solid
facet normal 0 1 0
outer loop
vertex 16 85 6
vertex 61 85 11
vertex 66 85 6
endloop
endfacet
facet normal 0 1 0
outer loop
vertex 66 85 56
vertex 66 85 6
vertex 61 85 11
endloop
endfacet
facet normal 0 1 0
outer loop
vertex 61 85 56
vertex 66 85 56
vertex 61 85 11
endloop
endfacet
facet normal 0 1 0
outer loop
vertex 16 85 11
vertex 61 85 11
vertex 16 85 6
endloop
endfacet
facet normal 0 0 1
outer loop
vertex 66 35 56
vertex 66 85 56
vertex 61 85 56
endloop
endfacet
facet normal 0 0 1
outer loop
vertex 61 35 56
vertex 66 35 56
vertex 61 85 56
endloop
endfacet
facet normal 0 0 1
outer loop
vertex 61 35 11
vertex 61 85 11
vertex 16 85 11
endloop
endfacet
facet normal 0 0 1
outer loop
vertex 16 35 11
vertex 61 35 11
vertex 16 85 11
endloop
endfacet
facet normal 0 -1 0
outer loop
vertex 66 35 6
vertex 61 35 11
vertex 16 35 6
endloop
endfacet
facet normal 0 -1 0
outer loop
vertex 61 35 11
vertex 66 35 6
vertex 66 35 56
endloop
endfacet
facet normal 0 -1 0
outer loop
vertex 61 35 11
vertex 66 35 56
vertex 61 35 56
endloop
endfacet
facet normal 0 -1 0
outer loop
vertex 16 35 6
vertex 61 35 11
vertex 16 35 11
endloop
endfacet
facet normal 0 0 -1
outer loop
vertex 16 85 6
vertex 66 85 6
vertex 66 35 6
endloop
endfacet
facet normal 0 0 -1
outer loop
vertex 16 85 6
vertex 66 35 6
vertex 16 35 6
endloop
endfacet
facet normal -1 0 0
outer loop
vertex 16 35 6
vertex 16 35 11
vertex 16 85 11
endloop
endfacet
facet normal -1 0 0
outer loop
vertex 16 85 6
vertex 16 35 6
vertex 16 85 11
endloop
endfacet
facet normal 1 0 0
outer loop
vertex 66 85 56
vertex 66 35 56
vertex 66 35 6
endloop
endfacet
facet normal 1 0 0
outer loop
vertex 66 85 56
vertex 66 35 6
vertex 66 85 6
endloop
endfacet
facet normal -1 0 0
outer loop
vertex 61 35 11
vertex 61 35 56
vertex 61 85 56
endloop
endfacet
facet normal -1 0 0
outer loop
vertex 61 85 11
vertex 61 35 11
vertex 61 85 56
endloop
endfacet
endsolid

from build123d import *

# Parameters (mm, degrees)
BOX007_W                  = 50
BOX007_H                  = 58
BOX007_DEPTH              = 50
BOX006_W                  = 50
BOX006_H                  = 50
BOX006_DEPTH              = 50
CUT002008_PLACEMENT_ANGLE = 180


with BuildPart() as cube002:
    # Box007 → Box007 (new body)
    with BuildSketch(Plane(origin=(5, -3, -5), x_dir=(1, 0, 0), z_dir=(0, 0, 1))):
        with Locations((25, 29)):
            Rectangle(BOX007_W, BOX007_H)
    extrude(amount=BOX007_DEPTH)


with BuildPart() as cut002008:
    # Box006 → Box006 (new body)
    with BuildSketch(Plane.XY):
        with Locations((25, 25)):
            Rectangle(BOX006_W, BOX006_H)
    extrude(amount=BOX006_DEPTH)

    # Cut002008: cut Cube002
    add(cube002.part, mode=Mode.SUBTRACT)


with BuildPart() as cut002008_1:
    # Cut002008 placement: moved
    add(cut002008.part.moved(Location((66, 35, 56))).rotate(Axis((66, 35, 56), (0, 1, 0)), CUT002008_PLACEMENT_ANGLE))


solid = cut002008_1.part
